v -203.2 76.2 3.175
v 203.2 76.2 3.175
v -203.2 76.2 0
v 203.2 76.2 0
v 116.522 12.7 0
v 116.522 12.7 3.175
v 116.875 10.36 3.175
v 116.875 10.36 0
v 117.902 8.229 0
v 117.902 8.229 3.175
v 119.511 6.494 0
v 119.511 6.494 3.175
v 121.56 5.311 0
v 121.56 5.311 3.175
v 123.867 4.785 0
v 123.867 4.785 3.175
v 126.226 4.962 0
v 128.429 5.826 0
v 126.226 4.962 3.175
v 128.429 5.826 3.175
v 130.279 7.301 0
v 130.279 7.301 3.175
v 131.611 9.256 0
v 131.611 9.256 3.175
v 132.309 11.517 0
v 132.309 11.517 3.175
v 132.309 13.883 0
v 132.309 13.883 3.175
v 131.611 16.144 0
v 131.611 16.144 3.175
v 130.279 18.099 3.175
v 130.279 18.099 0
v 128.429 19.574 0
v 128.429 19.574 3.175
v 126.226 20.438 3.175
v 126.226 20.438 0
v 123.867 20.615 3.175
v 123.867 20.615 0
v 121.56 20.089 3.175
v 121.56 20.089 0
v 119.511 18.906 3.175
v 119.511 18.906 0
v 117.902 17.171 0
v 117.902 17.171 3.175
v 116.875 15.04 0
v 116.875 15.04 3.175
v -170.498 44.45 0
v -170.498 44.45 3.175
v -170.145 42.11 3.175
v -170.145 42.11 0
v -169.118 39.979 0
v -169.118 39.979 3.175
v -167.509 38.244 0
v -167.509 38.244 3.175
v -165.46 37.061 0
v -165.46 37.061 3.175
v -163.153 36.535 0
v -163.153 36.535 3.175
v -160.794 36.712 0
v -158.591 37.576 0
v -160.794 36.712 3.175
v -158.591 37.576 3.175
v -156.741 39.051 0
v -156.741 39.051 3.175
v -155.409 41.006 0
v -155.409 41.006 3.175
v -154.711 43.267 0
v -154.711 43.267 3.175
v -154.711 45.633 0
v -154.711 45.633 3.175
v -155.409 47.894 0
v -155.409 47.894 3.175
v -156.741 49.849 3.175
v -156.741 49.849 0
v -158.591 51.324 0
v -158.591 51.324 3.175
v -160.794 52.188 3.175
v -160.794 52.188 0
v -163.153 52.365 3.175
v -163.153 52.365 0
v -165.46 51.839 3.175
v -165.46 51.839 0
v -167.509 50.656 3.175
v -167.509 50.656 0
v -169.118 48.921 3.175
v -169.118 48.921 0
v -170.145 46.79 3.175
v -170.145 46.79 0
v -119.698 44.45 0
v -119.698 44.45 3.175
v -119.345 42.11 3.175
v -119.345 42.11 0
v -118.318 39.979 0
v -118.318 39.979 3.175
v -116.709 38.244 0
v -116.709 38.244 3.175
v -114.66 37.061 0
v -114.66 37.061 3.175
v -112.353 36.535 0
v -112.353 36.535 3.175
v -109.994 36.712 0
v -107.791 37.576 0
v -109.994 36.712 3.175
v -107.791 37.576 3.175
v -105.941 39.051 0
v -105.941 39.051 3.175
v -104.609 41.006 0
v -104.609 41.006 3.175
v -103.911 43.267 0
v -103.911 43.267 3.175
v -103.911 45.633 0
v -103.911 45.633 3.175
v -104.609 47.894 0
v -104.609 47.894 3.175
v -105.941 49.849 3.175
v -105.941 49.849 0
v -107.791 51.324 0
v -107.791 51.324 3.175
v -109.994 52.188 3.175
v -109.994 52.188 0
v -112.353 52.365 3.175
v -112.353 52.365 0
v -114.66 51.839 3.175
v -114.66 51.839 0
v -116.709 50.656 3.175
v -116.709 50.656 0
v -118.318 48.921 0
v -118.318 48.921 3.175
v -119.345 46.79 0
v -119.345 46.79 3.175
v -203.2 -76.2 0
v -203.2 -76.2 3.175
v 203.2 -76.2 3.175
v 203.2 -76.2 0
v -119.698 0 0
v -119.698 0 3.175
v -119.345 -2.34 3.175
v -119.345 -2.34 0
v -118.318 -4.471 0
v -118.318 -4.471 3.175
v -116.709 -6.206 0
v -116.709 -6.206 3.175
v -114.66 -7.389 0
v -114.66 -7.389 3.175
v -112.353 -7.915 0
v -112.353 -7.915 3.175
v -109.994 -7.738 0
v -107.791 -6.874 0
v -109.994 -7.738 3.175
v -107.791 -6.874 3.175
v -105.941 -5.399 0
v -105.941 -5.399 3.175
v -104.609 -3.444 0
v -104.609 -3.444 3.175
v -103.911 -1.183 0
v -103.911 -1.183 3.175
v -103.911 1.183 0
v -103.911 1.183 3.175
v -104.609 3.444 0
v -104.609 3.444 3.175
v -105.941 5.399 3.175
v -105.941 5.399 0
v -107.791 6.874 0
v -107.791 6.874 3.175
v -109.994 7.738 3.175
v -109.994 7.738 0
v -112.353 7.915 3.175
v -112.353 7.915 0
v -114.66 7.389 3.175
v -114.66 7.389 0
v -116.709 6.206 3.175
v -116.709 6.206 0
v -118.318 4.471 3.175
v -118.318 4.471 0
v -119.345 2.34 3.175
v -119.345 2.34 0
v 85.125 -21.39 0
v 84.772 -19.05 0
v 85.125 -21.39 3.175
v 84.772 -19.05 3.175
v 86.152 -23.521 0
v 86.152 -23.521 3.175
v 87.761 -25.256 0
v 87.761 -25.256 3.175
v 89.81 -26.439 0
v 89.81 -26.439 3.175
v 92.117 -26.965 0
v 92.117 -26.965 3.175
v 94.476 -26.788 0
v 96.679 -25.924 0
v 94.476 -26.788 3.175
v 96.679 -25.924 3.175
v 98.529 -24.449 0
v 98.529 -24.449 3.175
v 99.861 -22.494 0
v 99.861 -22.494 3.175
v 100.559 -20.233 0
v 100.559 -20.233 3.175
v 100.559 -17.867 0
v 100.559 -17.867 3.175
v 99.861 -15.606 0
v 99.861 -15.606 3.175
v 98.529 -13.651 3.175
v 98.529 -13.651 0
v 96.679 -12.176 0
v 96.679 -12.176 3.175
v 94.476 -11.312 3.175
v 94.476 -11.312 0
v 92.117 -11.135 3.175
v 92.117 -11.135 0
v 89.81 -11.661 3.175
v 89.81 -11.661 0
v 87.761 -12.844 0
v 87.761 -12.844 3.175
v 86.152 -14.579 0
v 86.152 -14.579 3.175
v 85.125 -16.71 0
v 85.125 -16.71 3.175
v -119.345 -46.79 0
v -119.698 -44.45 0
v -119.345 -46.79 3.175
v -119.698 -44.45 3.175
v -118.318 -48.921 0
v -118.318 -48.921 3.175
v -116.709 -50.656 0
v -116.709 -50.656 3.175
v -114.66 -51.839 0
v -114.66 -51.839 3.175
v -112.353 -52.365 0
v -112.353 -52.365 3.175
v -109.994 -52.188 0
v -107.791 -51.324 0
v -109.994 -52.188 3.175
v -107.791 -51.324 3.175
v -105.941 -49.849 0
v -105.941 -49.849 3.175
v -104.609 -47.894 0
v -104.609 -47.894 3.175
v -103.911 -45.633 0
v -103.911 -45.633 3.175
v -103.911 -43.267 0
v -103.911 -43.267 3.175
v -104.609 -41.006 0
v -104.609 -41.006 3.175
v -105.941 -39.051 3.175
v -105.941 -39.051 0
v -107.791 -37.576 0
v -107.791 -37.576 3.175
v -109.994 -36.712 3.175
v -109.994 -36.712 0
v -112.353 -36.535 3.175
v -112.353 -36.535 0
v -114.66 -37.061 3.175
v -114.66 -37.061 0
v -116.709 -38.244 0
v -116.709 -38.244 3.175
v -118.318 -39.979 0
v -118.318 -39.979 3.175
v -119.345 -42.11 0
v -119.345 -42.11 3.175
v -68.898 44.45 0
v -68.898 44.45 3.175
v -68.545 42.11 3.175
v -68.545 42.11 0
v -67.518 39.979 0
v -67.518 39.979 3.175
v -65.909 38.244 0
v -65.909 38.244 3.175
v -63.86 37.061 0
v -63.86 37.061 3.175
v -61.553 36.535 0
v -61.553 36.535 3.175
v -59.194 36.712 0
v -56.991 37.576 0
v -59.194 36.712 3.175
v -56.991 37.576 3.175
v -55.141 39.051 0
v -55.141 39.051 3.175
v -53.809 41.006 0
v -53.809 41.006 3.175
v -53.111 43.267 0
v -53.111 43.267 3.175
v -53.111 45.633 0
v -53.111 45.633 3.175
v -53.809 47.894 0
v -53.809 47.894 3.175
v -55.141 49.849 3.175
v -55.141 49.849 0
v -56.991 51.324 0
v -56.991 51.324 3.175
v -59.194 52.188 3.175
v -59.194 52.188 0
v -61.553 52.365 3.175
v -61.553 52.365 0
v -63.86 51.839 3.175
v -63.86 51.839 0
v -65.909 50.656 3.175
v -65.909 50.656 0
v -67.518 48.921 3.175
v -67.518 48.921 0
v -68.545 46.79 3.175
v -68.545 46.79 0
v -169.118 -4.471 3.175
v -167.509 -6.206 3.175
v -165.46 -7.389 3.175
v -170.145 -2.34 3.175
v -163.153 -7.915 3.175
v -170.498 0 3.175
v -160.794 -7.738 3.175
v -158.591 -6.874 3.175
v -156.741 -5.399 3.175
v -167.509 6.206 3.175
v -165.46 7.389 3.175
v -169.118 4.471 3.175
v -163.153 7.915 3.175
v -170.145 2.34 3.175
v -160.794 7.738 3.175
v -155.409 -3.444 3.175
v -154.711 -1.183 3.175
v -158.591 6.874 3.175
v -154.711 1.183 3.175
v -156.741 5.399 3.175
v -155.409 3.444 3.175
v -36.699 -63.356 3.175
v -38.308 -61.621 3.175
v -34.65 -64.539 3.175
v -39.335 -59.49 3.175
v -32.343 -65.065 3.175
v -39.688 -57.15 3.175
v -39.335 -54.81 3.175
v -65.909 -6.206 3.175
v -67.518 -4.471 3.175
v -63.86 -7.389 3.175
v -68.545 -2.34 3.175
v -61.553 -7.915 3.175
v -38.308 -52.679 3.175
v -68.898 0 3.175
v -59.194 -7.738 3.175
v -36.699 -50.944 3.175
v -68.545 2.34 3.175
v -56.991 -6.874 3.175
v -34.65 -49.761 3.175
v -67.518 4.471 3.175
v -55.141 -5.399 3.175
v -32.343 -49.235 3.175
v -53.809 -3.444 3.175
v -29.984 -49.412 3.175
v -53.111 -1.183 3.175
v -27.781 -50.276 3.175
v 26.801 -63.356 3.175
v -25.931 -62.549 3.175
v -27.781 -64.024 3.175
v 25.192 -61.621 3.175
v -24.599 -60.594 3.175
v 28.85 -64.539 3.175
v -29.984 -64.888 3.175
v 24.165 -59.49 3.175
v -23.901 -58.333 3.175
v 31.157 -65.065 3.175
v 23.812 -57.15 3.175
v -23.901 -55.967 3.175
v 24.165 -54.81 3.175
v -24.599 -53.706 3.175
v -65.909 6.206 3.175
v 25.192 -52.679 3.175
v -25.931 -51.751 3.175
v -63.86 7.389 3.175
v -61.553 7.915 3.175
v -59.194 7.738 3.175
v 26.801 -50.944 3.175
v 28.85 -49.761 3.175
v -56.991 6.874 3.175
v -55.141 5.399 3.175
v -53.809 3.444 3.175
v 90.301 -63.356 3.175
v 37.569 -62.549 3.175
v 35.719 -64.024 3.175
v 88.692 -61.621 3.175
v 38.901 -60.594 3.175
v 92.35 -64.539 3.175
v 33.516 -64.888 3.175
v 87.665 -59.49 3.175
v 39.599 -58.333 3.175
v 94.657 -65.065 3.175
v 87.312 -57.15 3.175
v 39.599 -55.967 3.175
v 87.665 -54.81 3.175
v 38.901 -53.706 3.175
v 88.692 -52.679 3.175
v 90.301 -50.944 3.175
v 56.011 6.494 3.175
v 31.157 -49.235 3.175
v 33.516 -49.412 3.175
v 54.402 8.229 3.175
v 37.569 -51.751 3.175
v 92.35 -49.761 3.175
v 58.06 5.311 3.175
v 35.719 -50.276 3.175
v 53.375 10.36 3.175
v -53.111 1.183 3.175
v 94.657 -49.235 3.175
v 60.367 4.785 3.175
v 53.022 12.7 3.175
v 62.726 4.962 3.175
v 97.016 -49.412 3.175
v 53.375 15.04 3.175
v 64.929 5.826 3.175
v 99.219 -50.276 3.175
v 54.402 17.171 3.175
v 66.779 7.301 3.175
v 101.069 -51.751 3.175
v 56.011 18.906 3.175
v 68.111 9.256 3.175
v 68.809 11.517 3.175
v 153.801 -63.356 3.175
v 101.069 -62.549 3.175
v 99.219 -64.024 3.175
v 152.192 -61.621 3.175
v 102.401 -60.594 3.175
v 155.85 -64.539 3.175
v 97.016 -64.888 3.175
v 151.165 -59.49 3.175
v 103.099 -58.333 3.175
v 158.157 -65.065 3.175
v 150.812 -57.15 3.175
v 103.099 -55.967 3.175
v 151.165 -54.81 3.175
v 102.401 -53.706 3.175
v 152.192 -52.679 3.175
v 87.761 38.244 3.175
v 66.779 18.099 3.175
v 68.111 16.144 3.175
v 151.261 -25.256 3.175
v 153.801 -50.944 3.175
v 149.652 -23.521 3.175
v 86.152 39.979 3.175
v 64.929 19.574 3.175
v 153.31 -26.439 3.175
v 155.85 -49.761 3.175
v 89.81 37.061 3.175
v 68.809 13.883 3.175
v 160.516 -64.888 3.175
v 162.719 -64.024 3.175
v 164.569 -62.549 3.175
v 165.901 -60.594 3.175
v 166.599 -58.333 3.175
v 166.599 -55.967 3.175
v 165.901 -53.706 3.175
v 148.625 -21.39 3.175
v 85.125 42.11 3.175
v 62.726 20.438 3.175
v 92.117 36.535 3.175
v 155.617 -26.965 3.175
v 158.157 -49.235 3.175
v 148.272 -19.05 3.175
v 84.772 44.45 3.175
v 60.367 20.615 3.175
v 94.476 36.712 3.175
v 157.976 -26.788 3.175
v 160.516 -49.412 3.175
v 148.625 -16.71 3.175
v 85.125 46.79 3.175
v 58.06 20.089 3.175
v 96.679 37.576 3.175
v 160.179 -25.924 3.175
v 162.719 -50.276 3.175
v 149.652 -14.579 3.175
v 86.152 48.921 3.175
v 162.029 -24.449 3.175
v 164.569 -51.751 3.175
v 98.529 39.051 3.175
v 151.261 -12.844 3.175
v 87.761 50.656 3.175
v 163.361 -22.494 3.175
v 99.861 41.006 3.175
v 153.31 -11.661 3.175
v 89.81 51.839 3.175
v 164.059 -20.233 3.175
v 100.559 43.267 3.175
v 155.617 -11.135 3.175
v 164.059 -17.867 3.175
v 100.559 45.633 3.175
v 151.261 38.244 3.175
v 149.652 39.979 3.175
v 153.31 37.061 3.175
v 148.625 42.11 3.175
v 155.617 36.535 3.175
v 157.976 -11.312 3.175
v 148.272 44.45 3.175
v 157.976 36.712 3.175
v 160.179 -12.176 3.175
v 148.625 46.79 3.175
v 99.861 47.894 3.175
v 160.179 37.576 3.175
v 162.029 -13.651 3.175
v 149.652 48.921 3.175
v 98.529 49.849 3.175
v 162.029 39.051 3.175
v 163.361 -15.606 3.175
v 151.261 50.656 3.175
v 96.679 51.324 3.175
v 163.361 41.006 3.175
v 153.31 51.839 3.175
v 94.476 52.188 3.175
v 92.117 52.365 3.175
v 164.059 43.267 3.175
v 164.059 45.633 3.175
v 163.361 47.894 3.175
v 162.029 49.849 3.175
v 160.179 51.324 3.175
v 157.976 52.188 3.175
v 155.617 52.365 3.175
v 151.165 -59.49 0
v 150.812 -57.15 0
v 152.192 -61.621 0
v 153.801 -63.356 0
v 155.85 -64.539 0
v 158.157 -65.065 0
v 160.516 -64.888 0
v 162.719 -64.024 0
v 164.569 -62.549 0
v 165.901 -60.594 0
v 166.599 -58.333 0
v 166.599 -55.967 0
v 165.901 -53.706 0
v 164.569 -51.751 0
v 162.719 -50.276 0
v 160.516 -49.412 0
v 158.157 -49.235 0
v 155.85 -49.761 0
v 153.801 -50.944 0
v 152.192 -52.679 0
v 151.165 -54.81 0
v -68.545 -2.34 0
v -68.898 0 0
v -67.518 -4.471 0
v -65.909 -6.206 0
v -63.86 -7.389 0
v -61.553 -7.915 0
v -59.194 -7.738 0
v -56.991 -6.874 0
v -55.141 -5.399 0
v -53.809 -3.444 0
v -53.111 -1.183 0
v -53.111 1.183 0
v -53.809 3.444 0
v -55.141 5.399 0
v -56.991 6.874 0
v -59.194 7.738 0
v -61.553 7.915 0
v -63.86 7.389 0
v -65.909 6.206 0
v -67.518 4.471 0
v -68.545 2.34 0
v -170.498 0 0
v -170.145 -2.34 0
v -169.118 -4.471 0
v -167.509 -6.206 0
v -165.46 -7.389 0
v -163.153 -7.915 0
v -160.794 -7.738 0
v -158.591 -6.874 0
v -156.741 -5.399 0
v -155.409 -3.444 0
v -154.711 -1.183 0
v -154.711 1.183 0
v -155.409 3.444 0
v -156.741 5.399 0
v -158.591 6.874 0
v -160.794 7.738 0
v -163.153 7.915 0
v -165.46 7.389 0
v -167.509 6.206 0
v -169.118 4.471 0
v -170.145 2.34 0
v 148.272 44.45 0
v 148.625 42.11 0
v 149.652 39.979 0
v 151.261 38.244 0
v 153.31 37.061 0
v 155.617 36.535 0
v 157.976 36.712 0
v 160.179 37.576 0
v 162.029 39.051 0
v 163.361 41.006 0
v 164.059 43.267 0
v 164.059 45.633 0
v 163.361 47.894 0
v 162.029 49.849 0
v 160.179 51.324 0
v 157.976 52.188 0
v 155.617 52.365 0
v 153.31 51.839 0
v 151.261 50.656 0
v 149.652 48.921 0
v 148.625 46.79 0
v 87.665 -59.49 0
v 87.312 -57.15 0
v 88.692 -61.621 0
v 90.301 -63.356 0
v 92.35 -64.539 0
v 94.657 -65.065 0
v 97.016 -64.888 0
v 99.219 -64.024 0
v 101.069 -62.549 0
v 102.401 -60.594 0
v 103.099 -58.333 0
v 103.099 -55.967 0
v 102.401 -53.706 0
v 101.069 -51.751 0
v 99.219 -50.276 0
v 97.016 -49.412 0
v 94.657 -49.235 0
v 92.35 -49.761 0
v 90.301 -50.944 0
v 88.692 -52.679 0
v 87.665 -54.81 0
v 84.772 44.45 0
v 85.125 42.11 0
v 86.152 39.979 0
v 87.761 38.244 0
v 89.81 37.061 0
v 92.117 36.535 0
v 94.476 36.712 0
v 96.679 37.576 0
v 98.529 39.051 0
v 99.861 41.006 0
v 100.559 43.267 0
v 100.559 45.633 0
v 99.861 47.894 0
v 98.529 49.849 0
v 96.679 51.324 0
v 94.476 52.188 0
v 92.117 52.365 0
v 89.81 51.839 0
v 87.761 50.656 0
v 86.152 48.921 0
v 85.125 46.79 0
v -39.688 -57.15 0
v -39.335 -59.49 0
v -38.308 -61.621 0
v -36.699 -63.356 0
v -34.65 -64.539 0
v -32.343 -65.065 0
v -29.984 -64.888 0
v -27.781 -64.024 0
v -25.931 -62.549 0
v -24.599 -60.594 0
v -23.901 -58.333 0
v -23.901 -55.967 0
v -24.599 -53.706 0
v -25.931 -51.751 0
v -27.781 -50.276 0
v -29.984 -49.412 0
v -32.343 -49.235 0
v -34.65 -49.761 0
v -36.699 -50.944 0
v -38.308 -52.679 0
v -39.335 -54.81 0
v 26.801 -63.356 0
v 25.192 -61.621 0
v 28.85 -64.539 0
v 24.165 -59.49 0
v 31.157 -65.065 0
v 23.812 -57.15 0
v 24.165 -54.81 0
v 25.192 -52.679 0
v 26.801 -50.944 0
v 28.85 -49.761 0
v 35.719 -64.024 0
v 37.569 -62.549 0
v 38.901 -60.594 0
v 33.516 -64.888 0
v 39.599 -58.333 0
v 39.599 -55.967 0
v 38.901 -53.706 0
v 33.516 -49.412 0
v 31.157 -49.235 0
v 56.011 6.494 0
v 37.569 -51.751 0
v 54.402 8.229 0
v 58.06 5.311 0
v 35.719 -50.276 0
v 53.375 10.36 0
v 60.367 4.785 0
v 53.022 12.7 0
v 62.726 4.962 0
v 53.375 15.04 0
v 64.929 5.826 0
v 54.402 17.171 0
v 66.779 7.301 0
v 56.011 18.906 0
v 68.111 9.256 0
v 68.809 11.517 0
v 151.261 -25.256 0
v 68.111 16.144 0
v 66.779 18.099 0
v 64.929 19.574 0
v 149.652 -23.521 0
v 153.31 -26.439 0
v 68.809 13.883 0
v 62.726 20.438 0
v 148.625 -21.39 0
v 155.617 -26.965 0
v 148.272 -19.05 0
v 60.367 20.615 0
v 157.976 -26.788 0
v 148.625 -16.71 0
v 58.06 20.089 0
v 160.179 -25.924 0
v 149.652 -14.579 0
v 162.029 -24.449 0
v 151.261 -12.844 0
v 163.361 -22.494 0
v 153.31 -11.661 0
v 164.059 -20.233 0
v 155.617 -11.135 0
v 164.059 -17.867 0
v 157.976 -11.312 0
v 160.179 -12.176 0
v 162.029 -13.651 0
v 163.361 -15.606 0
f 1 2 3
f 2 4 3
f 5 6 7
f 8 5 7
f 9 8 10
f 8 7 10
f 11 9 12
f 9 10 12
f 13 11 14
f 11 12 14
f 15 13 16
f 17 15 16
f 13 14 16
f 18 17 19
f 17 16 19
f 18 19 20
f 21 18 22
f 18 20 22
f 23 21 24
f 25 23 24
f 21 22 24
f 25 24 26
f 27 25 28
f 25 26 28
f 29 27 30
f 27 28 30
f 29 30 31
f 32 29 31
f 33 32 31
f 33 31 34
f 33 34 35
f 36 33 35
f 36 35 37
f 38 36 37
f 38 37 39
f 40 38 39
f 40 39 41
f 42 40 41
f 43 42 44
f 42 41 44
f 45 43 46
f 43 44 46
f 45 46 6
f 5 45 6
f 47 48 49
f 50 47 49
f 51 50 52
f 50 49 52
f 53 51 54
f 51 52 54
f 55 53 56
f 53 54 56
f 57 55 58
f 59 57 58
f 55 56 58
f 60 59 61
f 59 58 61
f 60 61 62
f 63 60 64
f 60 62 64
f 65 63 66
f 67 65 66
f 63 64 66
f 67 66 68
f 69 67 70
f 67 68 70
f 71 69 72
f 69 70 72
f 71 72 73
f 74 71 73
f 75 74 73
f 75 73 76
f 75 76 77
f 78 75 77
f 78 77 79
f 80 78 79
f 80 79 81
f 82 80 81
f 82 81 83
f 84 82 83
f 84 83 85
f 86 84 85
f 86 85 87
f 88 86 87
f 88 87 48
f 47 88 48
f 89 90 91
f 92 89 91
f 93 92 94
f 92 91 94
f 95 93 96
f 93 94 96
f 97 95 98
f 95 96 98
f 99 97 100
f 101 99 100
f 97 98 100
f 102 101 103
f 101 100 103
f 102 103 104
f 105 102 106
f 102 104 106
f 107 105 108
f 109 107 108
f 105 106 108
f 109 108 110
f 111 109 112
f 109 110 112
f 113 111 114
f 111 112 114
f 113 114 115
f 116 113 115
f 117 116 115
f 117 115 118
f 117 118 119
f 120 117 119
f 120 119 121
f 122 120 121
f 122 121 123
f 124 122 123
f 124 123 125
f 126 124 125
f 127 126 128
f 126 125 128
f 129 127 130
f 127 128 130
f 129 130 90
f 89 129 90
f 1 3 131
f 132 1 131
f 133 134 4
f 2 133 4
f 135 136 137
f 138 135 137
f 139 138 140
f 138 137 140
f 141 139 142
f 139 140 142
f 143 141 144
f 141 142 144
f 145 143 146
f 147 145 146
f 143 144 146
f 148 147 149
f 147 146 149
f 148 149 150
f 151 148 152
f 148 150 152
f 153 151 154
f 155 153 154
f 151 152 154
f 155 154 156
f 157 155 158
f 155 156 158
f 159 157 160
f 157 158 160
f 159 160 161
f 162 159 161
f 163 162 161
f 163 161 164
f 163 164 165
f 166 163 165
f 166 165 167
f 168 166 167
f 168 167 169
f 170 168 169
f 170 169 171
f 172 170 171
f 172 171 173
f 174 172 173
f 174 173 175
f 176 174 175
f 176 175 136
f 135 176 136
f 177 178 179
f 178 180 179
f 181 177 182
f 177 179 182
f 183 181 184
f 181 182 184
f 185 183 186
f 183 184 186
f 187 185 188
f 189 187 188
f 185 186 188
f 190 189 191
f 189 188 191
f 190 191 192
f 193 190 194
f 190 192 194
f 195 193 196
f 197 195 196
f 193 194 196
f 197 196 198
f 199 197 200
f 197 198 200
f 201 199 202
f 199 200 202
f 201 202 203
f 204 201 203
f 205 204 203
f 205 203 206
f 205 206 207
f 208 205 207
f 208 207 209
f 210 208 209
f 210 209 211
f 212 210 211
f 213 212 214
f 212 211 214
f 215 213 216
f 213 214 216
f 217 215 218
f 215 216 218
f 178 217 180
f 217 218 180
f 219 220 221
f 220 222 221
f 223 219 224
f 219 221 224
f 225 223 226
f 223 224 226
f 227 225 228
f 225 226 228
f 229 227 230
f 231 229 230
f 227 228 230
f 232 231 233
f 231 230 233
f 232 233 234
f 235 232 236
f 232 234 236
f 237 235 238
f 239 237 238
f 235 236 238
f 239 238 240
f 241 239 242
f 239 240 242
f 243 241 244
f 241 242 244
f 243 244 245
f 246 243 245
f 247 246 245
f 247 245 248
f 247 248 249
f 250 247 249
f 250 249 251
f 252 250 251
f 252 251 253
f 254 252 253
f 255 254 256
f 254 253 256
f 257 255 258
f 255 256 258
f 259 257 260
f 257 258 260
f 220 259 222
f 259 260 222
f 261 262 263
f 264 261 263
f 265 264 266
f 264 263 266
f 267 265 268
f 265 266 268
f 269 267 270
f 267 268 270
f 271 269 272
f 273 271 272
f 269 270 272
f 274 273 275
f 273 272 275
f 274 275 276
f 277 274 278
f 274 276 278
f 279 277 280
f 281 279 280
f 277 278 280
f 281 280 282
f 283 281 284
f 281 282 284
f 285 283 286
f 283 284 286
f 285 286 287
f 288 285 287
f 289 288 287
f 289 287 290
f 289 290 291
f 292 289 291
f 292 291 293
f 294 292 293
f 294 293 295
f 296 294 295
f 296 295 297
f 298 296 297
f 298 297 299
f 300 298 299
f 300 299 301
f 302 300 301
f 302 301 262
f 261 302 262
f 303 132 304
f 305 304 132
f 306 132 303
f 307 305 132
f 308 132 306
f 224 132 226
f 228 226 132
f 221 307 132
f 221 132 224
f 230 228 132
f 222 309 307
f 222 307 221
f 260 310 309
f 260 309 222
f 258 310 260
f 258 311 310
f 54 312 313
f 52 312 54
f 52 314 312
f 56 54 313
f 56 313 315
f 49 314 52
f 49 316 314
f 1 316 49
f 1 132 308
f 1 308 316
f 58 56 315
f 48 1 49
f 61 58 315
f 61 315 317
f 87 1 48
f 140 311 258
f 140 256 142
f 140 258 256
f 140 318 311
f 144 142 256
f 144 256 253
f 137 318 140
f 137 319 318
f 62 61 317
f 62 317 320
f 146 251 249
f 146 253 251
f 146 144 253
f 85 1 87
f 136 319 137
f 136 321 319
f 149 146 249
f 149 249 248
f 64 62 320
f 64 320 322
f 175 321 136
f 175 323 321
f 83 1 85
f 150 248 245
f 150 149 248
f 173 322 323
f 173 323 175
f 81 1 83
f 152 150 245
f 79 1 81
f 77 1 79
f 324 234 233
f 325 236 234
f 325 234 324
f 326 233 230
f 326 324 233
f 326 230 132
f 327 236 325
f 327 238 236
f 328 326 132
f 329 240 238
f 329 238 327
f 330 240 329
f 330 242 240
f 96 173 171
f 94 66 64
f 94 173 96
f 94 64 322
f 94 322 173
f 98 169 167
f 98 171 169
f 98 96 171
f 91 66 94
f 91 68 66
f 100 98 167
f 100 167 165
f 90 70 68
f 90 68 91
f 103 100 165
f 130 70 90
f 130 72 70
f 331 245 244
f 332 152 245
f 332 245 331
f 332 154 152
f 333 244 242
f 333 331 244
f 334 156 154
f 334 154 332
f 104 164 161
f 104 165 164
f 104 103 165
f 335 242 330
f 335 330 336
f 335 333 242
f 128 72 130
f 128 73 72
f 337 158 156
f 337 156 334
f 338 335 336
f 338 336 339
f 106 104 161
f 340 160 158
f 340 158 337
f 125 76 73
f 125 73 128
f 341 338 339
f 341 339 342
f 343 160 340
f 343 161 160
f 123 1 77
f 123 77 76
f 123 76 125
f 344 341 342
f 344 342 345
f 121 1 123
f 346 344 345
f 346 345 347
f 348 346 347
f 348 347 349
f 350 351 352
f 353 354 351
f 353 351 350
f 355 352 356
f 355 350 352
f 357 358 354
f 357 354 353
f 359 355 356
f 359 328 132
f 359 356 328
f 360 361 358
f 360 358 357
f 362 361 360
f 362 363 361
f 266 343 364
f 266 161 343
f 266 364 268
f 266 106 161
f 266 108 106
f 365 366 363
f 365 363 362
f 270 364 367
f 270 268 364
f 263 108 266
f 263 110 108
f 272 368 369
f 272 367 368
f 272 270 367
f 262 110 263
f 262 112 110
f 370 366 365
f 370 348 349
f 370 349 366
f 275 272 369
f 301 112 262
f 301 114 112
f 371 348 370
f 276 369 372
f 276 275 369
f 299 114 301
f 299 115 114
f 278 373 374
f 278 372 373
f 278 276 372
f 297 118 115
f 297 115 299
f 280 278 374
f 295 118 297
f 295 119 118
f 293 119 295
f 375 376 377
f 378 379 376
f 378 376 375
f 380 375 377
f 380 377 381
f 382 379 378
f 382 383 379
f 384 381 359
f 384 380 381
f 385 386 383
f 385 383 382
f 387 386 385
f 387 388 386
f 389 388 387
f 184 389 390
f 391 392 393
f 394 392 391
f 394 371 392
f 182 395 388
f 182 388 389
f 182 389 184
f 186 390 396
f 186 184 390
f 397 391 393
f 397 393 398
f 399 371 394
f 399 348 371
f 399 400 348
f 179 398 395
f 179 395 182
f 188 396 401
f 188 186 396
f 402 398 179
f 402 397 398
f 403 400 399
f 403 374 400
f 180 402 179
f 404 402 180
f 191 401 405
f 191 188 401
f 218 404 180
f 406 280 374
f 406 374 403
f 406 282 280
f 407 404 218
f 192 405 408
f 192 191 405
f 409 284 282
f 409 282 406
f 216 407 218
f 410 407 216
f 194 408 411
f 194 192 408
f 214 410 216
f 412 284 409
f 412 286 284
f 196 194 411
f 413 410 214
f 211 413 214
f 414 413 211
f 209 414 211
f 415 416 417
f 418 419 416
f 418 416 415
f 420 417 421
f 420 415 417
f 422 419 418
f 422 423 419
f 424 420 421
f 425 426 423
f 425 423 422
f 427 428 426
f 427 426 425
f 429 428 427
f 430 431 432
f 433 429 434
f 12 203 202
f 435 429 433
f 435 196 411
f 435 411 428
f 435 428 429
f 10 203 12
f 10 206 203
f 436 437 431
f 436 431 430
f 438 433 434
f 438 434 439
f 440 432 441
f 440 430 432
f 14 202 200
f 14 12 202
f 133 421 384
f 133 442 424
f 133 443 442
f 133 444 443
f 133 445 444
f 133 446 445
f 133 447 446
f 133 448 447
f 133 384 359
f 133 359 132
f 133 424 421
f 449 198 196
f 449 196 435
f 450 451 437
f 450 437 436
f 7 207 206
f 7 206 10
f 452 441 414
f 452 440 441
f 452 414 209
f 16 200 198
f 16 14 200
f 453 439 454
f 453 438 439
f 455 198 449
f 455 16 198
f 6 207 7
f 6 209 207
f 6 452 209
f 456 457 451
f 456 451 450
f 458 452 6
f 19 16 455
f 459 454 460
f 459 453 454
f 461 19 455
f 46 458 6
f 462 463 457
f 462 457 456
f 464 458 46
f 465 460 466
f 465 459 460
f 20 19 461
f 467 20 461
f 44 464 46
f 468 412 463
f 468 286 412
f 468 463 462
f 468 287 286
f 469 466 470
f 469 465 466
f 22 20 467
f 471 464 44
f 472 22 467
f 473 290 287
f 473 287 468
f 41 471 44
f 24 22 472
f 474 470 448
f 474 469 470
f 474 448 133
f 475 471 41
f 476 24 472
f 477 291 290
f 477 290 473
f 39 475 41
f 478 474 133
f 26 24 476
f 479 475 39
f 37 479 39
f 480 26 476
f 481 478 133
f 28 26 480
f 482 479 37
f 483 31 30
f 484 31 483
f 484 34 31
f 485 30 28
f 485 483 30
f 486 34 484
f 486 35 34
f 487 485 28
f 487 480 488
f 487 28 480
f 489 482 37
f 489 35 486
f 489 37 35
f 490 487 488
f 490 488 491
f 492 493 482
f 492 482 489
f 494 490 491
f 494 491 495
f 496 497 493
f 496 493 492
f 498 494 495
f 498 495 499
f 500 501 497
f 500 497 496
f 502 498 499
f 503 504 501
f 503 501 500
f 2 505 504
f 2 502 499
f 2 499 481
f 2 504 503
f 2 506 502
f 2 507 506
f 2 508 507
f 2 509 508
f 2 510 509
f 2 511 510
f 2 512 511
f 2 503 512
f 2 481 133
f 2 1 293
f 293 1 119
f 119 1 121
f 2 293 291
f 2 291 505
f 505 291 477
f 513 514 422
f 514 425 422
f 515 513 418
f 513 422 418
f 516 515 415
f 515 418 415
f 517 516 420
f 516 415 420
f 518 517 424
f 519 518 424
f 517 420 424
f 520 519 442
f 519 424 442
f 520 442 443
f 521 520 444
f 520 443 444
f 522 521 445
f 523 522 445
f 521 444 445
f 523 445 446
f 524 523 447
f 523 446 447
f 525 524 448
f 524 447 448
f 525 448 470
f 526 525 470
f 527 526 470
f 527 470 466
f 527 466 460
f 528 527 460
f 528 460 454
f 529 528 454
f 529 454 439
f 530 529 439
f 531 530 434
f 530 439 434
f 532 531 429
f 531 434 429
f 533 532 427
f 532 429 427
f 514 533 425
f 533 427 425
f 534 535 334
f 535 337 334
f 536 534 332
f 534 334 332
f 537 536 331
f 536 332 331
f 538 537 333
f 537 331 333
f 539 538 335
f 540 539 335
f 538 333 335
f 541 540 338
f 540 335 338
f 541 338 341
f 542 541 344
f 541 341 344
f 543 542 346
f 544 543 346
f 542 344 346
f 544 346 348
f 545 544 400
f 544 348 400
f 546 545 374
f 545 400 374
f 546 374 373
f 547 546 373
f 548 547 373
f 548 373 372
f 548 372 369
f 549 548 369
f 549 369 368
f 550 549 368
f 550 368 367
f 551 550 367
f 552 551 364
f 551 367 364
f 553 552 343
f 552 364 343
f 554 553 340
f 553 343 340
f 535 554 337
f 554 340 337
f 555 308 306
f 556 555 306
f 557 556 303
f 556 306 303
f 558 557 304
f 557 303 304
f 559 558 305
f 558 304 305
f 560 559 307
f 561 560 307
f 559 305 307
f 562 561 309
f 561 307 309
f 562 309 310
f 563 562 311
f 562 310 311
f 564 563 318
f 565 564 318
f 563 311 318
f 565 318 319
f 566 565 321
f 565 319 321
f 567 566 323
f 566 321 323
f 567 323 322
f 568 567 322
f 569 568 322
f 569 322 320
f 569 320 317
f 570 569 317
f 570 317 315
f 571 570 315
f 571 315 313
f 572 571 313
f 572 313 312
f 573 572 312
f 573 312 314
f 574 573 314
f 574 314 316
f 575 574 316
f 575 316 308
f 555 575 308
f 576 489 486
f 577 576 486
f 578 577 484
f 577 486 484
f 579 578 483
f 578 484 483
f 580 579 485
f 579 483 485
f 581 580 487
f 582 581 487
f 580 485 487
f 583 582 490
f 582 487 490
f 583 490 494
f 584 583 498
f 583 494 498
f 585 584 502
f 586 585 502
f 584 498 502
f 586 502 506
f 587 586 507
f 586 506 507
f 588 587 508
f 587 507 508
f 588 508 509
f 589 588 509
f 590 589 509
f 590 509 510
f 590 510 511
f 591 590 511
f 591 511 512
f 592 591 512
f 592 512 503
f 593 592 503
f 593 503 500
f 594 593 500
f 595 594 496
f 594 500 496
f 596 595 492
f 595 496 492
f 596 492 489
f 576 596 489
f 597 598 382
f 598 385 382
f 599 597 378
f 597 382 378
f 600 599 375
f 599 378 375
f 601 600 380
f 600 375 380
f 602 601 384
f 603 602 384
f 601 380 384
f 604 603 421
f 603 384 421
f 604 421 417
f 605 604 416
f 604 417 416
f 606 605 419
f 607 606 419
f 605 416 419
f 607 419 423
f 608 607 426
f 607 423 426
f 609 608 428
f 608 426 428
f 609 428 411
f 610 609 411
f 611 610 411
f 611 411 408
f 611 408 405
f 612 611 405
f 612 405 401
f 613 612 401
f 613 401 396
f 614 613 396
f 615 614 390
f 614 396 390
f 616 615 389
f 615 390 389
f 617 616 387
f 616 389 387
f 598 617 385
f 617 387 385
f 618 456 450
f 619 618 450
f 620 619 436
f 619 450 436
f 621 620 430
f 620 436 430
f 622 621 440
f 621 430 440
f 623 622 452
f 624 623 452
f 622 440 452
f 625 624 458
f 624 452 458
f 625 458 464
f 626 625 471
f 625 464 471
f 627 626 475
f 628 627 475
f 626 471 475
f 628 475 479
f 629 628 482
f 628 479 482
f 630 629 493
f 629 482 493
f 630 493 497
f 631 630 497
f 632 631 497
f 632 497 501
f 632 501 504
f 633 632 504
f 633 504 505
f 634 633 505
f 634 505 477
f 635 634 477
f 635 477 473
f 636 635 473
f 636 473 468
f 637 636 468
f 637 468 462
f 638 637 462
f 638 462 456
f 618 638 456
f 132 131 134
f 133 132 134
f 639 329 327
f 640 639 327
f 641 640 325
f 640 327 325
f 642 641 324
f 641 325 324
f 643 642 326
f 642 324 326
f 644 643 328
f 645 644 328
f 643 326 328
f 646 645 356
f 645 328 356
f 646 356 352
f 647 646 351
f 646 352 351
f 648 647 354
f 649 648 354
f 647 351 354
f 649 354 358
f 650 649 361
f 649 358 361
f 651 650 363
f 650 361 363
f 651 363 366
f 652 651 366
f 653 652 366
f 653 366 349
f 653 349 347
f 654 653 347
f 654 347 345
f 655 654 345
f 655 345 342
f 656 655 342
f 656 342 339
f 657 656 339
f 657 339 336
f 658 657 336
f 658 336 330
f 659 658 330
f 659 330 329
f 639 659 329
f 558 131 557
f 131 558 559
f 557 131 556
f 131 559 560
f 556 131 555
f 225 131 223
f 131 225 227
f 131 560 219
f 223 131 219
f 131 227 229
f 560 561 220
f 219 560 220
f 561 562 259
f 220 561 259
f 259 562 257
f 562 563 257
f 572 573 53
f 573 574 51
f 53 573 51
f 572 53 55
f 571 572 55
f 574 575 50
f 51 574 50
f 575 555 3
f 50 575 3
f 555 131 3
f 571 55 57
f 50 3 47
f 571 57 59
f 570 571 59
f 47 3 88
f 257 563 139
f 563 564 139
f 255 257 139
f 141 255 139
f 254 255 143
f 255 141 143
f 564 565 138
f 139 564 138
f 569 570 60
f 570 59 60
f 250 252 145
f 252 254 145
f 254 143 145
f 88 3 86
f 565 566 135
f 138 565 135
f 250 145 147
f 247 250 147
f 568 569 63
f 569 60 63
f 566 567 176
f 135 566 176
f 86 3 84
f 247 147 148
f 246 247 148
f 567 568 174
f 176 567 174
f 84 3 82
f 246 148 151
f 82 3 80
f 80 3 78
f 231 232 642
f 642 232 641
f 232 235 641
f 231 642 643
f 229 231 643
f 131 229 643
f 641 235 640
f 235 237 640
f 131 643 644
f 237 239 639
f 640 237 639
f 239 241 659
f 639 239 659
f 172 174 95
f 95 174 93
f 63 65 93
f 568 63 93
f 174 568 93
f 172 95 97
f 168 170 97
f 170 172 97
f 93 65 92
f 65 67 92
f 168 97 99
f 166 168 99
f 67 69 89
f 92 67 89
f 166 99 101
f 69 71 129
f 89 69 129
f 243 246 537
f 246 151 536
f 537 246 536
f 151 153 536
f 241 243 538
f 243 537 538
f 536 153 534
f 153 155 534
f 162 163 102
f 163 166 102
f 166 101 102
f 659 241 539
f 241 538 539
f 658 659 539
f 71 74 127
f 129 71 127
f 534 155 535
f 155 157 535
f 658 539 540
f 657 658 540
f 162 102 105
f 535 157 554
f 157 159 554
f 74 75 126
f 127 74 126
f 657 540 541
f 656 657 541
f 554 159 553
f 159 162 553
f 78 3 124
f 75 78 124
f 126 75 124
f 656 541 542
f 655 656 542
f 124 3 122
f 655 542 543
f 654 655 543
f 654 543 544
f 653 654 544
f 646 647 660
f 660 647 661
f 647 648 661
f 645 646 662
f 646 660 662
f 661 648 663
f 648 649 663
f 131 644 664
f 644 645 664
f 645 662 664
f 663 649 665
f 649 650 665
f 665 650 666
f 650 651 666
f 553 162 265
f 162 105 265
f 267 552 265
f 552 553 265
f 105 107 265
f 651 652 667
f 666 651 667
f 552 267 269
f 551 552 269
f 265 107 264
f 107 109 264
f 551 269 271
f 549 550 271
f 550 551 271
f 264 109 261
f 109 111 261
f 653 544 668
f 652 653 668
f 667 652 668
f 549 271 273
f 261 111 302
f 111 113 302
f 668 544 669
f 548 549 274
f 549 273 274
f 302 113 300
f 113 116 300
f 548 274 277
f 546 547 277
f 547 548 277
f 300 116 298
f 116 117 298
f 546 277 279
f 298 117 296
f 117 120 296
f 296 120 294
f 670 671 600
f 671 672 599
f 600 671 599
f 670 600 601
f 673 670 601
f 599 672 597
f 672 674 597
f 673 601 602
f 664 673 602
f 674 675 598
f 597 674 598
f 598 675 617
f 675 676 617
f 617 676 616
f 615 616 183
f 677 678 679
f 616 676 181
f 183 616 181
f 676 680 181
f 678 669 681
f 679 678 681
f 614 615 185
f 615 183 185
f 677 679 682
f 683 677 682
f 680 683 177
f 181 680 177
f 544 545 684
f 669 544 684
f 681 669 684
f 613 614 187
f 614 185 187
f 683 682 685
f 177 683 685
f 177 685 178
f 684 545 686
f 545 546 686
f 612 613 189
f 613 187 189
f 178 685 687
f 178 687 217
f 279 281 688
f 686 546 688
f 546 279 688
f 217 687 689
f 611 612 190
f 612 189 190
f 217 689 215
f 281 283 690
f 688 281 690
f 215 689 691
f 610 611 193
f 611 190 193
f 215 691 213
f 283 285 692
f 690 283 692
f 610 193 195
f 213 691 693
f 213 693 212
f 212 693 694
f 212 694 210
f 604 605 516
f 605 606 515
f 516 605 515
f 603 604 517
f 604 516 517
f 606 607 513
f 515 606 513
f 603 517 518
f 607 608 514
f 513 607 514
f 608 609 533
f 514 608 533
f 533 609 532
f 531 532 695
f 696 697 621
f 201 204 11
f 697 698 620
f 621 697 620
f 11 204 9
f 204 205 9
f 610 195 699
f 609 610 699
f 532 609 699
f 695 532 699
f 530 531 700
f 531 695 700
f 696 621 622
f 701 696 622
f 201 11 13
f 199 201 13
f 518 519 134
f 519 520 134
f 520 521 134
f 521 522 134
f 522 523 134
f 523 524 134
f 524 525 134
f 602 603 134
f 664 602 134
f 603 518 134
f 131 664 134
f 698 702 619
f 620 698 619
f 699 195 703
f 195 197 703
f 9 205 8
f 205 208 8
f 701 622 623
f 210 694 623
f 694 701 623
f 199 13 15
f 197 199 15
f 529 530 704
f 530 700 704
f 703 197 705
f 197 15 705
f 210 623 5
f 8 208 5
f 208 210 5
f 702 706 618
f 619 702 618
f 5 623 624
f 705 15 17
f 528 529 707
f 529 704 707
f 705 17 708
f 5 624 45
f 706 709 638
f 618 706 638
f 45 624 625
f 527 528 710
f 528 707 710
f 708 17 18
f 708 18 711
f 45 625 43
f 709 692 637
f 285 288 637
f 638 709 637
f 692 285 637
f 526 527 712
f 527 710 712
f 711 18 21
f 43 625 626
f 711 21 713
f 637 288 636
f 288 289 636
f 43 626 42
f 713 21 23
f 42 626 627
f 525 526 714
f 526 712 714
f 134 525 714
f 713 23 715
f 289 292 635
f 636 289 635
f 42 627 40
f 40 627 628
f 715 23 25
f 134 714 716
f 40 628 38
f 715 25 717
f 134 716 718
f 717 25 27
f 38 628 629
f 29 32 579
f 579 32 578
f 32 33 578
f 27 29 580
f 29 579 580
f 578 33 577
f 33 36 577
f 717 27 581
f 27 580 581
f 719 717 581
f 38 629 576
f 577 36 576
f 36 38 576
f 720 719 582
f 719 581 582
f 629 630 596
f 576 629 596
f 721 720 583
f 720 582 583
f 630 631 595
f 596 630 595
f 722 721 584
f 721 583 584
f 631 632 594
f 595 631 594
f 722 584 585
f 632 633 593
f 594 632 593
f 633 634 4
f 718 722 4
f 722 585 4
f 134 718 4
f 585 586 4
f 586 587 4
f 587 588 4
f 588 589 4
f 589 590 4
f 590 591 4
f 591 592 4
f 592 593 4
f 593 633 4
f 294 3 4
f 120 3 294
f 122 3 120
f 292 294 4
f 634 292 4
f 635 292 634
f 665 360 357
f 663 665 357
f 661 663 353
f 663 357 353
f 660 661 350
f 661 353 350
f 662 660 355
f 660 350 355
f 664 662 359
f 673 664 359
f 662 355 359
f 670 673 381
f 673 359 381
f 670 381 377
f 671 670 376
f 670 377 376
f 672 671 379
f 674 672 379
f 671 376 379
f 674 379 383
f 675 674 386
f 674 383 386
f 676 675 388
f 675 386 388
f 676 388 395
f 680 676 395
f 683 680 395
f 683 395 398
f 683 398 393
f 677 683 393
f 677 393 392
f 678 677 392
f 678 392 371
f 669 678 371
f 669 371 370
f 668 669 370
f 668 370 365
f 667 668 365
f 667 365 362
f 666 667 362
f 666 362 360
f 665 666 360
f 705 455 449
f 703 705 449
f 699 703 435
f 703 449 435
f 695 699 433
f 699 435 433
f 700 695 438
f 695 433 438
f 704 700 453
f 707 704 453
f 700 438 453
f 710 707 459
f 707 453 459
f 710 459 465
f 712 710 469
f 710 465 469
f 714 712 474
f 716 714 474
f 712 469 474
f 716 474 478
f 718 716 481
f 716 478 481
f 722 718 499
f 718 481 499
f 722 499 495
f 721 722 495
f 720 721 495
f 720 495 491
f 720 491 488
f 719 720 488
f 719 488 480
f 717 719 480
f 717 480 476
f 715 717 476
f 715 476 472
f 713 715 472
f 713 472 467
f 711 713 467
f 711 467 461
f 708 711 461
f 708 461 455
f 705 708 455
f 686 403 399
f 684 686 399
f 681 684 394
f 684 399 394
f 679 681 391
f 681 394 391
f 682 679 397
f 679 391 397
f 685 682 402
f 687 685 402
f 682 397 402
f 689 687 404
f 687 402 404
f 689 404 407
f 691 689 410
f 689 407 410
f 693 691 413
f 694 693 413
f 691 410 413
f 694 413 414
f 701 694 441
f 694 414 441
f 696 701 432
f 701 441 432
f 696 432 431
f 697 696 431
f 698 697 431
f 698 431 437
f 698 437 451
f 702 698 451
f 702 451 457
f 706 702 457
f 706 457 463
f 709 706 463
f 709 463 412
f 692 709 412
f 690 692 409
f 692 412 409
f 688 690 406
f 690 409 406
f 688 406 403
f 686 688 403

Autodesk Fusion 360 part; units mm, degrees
sketch "Sketch1" plane through (0, 0, 0) normal (0, 0, 1) x (1, 0, 0)
  line L0 (203.2, 76.2) -> (-203.2, 76.2)
  line L1 (-203.2, 76.2) -> (-203.2, -76.2)
  line L2 (-203.2, -76.2) -> (203.2, -76.2)
  line L3 (203.2, -76.2) -> (203.2, 76.2)
  line L4 (203.2, 76.2) -> (-203.2, -76.2) construction
  line L5 (-203.2, 76.2) -> (203.2, -76.2) construction
  dimension "d1" = 406.4
  dimension "d2" = 152.4
extrude "Extrude1" add sketch "Sketch1" along normal blind 3.175
sketch "Sketch2" plane through (0, 0, 3.175) normal (0, 0, 1) x (-1, 0, 0)
  line L0 (-203.2, 76.2) -> (-203.2, -76.2)
  line L1 (-203.2, -76.2) -> (203.2, -76.2)
  line L2 (203.2, -76.2) -> (203.2, 76.2)
  line L3 (203.2, 76.2) -> (-203.2, 76.2)
  circle A0 centre (162.56, -44.45) radius 7.9375
  circle A1 centre (111.76, -44.45) radius 7.9375
  circle A2 centre (60.96, -44.45) radius 7.9375
  line L4 (203.2, -44.45) -> (-203.2, -44.45) construction
  line L5 (203.2, -60.325) -> (-203.2, -60.325) construction
  circle A3 centre (162.56, -44.45) radius 10.795 construction
  line L6 (172.6056, -60.325) -> (-27.8584, -60.325) construction
  line L7 (-27.8584, -60.325) -> (-27.8584, -69.85) construction
  line L8 (-27.8584, -69.85) -> (172.6056, -69.85) construction
  line L9 (172.6056, -69.85) -> (172.6056, -60.325) construction
  circle A4 centre (162.56, 0) radius 7.9375
  circle A5 centre (111.76, 0) radius 7.9375
  circle A6 centre (60.96, 0) radius 7.9375
  line L10 (203.2, 0) -> (-203.2, 0) construction
  line L11 (203.2, -15.875) -> (-203.2, -15.875) construction
  line L12 (203.2, 44.45) -> (-203.2, 44.45) construction
  line L13 (203.2, 28.575) -> (-203.2, 28.575) construction
  circle A7 centre (111.76, 44.45) radius 7.9375
  line L14 (183.6475, -15.875) -> (19.338, -15.875) construction
  line L15 (19.338, -15.875) -> (19.338, -25.4) construction
  line L16 (19.338, -25.4) -> (183.6475, -25.4) construction
  line L17 (183.6475, -25.4) -> (183.6475, -15.875) construction
  line L18 (128.4518, 28.575) -> (89.2673, 28.575) construction
  line L19 (89.2673, 28.575) -> (89.2673, 19.05) construction
  line L20 (89.2673, 19.05) -> (128.4518, 19.05) construction
  line L21 (128.4518, 19.05) -> (128.4518, 28.575) construction
  dimension "button" = 15.875
  dimension "d6" = 15.875
  dimension "d7" = 15.875
  dimension "d9" = 50.8
  dimension "d10" = 50.8
  dimension "d12" = 15.875
  dimension "d13" = 21.59
  dimension "d14" = 9.525
  dimension "d17" = 9.525
  dimension "d22" = 15.875
  dimension "d23" = 15.875
  dimension "d24" = 15.875
  dimension "d25" = 50.8
  dimension "d26" = 50.8
  dimension "d28" = 44.45
  dimension "d29" = 15.875
  dimension "d36" = 44.45
  dimension "d37" = 15.875
  dimension "d38" = 15.875
  dimension "d84" = 50.8
  dimension "d85" = 60.96
  dimension "d86" = 60.96
  dimension "d88" = 152.4
  dimension "d89" = 406.4
  dimension "d96" = 10.0456
  dimension "d105" = 9.525
  dimension "d106" = 9.525
  dimension "d107" = 9.525
  dimension "d108" = 9.525
extrude "Extrude3" cut sketch "Sketch2" against normal blind 50.8 contours A0 | A1 | A2 | A4 | A5 | A6 | A7
sketch "Sketch3" plane through (0, 0, 3.175) normal (0, 0, 1) x (-1, 0, 0)
  circle A0 centre (111.76, 0) radius 7.9375
  circle A1 centre (162.56, -44.45) radius 7.9375
  circle A2 centre (60.96, 0) radius 7.9375
  circle A3 centre (162.56, 0) radius 7.9375
  circle A4 centre (111.76, -44.45) radius 7.9375
  circle A5 centre (60.96, -44.45) radius 7.9375
  circle A6 centre (111.76, 44.45) radius 7.9375
  line L0 (-203.2, 76.2) -> (-203.2, -76.2)
  line L1 (-203.2, -76.2) -> (203.2, -76.2)
  line L2 (203.2, -76.2) -> (203.2, 76.2)
  line L3 (203.2, 76.2) -> (-203.2, 76.2)
  circle A7 centre (-92.71, -44.45) radius 7.9375
  circle A8 centre (-92.71, 19.05) radius 7.9375
  circle A9 centre (-60.96, -12.7) radius 7.9375
  circle A10 centre (-124.46, -12.7) radius 7.9375
  line L4 (-92.71, -44.45) -> (-92.71, 19.05) construction
  line L5 (-60.96, -12.7) -> (-124.46, -12.7) construction
  line L6 (-72.6401, -60.325) -> (-119.2488, -60.325) construction
  line L7 (-87.0646, -60.325) -> (-106.5413, -60.325) construction
  line L8 (-106.5413, -60.325) -> (-106.5413, -69.85) construction
  line L9 (-106.5413, -69.85) -> (-87.0646, -69.85) construction
  line L10 (-87.0646, -69.85) -> (-87.0646, -60.325) construction
  line L11 (-84.0964, 3.175) -> (-85.2577, 3.175)
  line L12 (-85.2577, 3.175) -> (-106.3727, 3.175) construction
  line L13 (-86.9218, 3.175) -> (-101.4306, 3.175) construction
  line L14 (-101.4306, 3.175) -> (-101.4306, -6.35) construction
  line L15 (-101.4306, -6.35) -> (-86.9218, -6.35) construction
  line L16 (-86.9218, -6.35) -> (-86.9218, 3.175) construction
  line L17 (-50.0842, -28.575) -> (-73.0383, -28.575) construction
  line L18 (-55.7529, -28.575) -> (-69.6326, -28.575) construction
  line L19 (-69.6326, -28.575) -> (-69.6326, -38.1) construction
  line L20 (-69.6326, -38.1) -> (-55.7529, -38.1) construction
  line L21 (-55.7529, -38.1) -> (-55.7529, -28.575) construction
  line L22 (-117.6854, -28.575) -> (-146.3556, -28.575) construction
  line L23 (-119.2474, -28.575) -> (-139.2811, -28.575) construction
  line L24 (-139.2811, -28.575) -> (-139.2811, -38.1) construction
  line L25 (-139.2811, -38.1) -> (-119.2474, -38.1) construction
  line L26 (-119.2474, -38.1) -> (-119.2474, -28.575) construction
  line L27 (-156.21, -44.45) -> (-156.21, 19.05) construction
  circle A11 centre (-156.21, -44.45) radius 7.9375
  circle A12 centre (-156.21, 19.05) radius 7.9375
  line L28 (-162.1579, 3.175) -> (-182.2496, 3.175) construction
  line L29 (-156.3761, -60.325) -> (-181.7712, -60.325) construction
  line L30 (-151.6704, -60.325) -> (-180.3361, -60.325) construction
  line L31 (-180.3361, -60.325) -> (-180.3361, -69.85) construction
  line L32 (-180.3361, -69.85) -> (-151.6704, -69.85) construction
  line L33 (-151.6704, -69.85) -> (-151.6704, -60.325) construction
  line L34 (-151.7847, 3.175) -> (-164.1052, 3.175) construction
  line L35 (-164.1052, 3.175) -> (-164.1052, -6.35) construction
  line L36 (-164.1052, -6.35) -> (-151.7847, -6.35) construction
  line L37 (-151.7847, -6.35) -> (-151.7847, 3.175) construction
  circle A13 centre (60.96, 0) radius 7.9375
  line L38 (-92.71, -44.45) -> (-92.71, -63.514) construction
  circle A14 centre (31.75, 57.15) radius 7.9375
  circle A15 centre (-31.75, 57.15) radius 7.9375
  line L39 (-19.4302, 41.275) -> (-47.0824, 41.275) construction
  line L40 (-18.4863, 41.275) -> (-133.9128, 41.275) construction
  line L41 (46.0464, 41.275) -> (2.2756, 41.275) construction
  line L42 (2.2756, 41.275) -> (2.2756, 34.925) construction
  line L43 (2.2756, 34.925) -> (46.0464, 34.925) construction
  line L44 (46.0464, 34.925) -> (46.0464, 41.275) construction
  line L45 (-18.4863, 41.275) -> (-69.5814, 41.3535) construction
  line L46 (-69.5814, 41.3535) -> (-69.5912, 35.0035) construction
  line L47 (-69.5912, 35.0035) -> (-18.496, 34.925) construction
  line L48 (-18.496, 34.925) -> (-18.4863, 41.275) construction
  circle A16 centre (-95.25, 57.15) radius 7.9375
  circle A17 centre (-158.75, 57.15) radius 7.9375
  line L49 (-86.5667, 41.275) -> (-118.397, 41.2226) construction
  line L50 (-118.397, 41.2226) -> (-118.3865, 34.8727) construction
  line L51 (-118.3865, 34.8727) -> (-86.5562, 34.925) construction
  line L52 (-86.5562, 34.925) -> (-86.5667, 41.275) construction
  line L53 (-148.8254, 41.4006) -> (-186.2835, 41.4006) construction
  line L54 (-186.2835, 41.4006) -> (-186.2835, 34.6904) construction
  line L55 (-186.2835, 34.6904) -> (-148.8254, 34.6904) construction
  line L56 (-148.8254, 34.6904) -> (-148.8254, 41.4006) construction
  point P0 (-92.71, -12.7)
  point P1 (-156.21, -12.7)
  dimension "d46" = 15.875
  dimension "d47" = 15.875
  dimension "d48" = 15.875
  dimension "d49" = 15.875
  dimension "d52" = 63.5
  dimension "d56" = 15.875
  dimension "d57" = 9.525
  dimension "d58" = 9.525
  dimension "d59" = 15.875
  dimension "d60" = 9.525
  dimension "d61" = 9.525
  dimension "d62" = 15.875
  dimension "d63" = 9.525
  dimension "d64" = 9.525
  dimension "d65" = 15.875
  dimension "d66" = 9.525
  dimension "d67" = 9.525
  dimension "d71" = 15.875
  dimension "d72" = 15.875
  dimension "d73" = 9.525
  dimension "d74" = 9.525
  dimension "d75" = 15.875
  dimension "d76" = 15.875
  dimension "d77" = 9.525
  dimension "d78" = 9.525
  dimension "d98" = 63.5
  dimension "d99" = 63.5
  dimension "d100" = 31.75
  dimension "d101" = 31.75
  dimension "d102" = 31.75
  dimension "d103" = 31.75
  dimension "d104" = 406.4
  dimension "d109" = 60.96
  dimension "d110" = 63.5
  dimension "d111" = 38.1
  dimension "d112" = 15.875
  dimension "d113" = 15.875
  dimension "d114" = 6.35
  dimension "d115" = 15.875
  dimension "d116" = 6.35
  dimension "d117" = 15.875
  dimension "d118" = 6.35
  dimension "d119" = 6.35
  dimension "d120" = 31.75
  dimension "d121" = 15.875
  dimension "d122" = 15.875
  dimension "d123" = 63.5
  dimension "d124" = 63.5
  dimension "d125" = 6.35
  dimension "d126" = 6.35
  dimension "d127" = 6.35
extrude "Extrude4" cut sketch "Sketch3" against normal blind 27.94 contours A7 | A8 | A9 | A10 | A11 | A12 | A14 | A15 | A16 | A17
sketch "Sketch4" plane through (0, 0, 3.175) normal (0, 0, 1) x (-1, 0, 0)
equation "d7 = d6"
equation "d9 = d25"
equation "d10 = d25"
equation "d22 = d6"
equation "d23 = d6"
equation "d24 = d6"
equation "d26 = d25"
equation "d38 = d6"
equation "d46 = d6"
equation "d47 = d6"
equation "d48 = d6"
equation "d49 = d6"
equation "d61 = d78"
equation "d64 = d78"
equation "d71 = d6"
equation "d72 = d6"
equation "d84 = d25"
equation "d85 = d89 * 0.15"
equation "d86 = d85"
equation "d99 = d98"
equation "d100 = d98 / 2"
equation "d101 = d100"
equation "d102 = d100"
equation "d103 = d100"
equation "d109 = d104 * 0.15"
equation "d110 = d98"
equation "d111 = d101 + 0.25 in"
equation "d112 = d47"
equation "d113 = d47"
equation "d115 = d62"
equation "d117 = d115"
equation "d120 = d110 / 2"
equation "d121 = d113"
equation "d122 = d113"
equation "d123 = d110"
equation "d124 = d99"
